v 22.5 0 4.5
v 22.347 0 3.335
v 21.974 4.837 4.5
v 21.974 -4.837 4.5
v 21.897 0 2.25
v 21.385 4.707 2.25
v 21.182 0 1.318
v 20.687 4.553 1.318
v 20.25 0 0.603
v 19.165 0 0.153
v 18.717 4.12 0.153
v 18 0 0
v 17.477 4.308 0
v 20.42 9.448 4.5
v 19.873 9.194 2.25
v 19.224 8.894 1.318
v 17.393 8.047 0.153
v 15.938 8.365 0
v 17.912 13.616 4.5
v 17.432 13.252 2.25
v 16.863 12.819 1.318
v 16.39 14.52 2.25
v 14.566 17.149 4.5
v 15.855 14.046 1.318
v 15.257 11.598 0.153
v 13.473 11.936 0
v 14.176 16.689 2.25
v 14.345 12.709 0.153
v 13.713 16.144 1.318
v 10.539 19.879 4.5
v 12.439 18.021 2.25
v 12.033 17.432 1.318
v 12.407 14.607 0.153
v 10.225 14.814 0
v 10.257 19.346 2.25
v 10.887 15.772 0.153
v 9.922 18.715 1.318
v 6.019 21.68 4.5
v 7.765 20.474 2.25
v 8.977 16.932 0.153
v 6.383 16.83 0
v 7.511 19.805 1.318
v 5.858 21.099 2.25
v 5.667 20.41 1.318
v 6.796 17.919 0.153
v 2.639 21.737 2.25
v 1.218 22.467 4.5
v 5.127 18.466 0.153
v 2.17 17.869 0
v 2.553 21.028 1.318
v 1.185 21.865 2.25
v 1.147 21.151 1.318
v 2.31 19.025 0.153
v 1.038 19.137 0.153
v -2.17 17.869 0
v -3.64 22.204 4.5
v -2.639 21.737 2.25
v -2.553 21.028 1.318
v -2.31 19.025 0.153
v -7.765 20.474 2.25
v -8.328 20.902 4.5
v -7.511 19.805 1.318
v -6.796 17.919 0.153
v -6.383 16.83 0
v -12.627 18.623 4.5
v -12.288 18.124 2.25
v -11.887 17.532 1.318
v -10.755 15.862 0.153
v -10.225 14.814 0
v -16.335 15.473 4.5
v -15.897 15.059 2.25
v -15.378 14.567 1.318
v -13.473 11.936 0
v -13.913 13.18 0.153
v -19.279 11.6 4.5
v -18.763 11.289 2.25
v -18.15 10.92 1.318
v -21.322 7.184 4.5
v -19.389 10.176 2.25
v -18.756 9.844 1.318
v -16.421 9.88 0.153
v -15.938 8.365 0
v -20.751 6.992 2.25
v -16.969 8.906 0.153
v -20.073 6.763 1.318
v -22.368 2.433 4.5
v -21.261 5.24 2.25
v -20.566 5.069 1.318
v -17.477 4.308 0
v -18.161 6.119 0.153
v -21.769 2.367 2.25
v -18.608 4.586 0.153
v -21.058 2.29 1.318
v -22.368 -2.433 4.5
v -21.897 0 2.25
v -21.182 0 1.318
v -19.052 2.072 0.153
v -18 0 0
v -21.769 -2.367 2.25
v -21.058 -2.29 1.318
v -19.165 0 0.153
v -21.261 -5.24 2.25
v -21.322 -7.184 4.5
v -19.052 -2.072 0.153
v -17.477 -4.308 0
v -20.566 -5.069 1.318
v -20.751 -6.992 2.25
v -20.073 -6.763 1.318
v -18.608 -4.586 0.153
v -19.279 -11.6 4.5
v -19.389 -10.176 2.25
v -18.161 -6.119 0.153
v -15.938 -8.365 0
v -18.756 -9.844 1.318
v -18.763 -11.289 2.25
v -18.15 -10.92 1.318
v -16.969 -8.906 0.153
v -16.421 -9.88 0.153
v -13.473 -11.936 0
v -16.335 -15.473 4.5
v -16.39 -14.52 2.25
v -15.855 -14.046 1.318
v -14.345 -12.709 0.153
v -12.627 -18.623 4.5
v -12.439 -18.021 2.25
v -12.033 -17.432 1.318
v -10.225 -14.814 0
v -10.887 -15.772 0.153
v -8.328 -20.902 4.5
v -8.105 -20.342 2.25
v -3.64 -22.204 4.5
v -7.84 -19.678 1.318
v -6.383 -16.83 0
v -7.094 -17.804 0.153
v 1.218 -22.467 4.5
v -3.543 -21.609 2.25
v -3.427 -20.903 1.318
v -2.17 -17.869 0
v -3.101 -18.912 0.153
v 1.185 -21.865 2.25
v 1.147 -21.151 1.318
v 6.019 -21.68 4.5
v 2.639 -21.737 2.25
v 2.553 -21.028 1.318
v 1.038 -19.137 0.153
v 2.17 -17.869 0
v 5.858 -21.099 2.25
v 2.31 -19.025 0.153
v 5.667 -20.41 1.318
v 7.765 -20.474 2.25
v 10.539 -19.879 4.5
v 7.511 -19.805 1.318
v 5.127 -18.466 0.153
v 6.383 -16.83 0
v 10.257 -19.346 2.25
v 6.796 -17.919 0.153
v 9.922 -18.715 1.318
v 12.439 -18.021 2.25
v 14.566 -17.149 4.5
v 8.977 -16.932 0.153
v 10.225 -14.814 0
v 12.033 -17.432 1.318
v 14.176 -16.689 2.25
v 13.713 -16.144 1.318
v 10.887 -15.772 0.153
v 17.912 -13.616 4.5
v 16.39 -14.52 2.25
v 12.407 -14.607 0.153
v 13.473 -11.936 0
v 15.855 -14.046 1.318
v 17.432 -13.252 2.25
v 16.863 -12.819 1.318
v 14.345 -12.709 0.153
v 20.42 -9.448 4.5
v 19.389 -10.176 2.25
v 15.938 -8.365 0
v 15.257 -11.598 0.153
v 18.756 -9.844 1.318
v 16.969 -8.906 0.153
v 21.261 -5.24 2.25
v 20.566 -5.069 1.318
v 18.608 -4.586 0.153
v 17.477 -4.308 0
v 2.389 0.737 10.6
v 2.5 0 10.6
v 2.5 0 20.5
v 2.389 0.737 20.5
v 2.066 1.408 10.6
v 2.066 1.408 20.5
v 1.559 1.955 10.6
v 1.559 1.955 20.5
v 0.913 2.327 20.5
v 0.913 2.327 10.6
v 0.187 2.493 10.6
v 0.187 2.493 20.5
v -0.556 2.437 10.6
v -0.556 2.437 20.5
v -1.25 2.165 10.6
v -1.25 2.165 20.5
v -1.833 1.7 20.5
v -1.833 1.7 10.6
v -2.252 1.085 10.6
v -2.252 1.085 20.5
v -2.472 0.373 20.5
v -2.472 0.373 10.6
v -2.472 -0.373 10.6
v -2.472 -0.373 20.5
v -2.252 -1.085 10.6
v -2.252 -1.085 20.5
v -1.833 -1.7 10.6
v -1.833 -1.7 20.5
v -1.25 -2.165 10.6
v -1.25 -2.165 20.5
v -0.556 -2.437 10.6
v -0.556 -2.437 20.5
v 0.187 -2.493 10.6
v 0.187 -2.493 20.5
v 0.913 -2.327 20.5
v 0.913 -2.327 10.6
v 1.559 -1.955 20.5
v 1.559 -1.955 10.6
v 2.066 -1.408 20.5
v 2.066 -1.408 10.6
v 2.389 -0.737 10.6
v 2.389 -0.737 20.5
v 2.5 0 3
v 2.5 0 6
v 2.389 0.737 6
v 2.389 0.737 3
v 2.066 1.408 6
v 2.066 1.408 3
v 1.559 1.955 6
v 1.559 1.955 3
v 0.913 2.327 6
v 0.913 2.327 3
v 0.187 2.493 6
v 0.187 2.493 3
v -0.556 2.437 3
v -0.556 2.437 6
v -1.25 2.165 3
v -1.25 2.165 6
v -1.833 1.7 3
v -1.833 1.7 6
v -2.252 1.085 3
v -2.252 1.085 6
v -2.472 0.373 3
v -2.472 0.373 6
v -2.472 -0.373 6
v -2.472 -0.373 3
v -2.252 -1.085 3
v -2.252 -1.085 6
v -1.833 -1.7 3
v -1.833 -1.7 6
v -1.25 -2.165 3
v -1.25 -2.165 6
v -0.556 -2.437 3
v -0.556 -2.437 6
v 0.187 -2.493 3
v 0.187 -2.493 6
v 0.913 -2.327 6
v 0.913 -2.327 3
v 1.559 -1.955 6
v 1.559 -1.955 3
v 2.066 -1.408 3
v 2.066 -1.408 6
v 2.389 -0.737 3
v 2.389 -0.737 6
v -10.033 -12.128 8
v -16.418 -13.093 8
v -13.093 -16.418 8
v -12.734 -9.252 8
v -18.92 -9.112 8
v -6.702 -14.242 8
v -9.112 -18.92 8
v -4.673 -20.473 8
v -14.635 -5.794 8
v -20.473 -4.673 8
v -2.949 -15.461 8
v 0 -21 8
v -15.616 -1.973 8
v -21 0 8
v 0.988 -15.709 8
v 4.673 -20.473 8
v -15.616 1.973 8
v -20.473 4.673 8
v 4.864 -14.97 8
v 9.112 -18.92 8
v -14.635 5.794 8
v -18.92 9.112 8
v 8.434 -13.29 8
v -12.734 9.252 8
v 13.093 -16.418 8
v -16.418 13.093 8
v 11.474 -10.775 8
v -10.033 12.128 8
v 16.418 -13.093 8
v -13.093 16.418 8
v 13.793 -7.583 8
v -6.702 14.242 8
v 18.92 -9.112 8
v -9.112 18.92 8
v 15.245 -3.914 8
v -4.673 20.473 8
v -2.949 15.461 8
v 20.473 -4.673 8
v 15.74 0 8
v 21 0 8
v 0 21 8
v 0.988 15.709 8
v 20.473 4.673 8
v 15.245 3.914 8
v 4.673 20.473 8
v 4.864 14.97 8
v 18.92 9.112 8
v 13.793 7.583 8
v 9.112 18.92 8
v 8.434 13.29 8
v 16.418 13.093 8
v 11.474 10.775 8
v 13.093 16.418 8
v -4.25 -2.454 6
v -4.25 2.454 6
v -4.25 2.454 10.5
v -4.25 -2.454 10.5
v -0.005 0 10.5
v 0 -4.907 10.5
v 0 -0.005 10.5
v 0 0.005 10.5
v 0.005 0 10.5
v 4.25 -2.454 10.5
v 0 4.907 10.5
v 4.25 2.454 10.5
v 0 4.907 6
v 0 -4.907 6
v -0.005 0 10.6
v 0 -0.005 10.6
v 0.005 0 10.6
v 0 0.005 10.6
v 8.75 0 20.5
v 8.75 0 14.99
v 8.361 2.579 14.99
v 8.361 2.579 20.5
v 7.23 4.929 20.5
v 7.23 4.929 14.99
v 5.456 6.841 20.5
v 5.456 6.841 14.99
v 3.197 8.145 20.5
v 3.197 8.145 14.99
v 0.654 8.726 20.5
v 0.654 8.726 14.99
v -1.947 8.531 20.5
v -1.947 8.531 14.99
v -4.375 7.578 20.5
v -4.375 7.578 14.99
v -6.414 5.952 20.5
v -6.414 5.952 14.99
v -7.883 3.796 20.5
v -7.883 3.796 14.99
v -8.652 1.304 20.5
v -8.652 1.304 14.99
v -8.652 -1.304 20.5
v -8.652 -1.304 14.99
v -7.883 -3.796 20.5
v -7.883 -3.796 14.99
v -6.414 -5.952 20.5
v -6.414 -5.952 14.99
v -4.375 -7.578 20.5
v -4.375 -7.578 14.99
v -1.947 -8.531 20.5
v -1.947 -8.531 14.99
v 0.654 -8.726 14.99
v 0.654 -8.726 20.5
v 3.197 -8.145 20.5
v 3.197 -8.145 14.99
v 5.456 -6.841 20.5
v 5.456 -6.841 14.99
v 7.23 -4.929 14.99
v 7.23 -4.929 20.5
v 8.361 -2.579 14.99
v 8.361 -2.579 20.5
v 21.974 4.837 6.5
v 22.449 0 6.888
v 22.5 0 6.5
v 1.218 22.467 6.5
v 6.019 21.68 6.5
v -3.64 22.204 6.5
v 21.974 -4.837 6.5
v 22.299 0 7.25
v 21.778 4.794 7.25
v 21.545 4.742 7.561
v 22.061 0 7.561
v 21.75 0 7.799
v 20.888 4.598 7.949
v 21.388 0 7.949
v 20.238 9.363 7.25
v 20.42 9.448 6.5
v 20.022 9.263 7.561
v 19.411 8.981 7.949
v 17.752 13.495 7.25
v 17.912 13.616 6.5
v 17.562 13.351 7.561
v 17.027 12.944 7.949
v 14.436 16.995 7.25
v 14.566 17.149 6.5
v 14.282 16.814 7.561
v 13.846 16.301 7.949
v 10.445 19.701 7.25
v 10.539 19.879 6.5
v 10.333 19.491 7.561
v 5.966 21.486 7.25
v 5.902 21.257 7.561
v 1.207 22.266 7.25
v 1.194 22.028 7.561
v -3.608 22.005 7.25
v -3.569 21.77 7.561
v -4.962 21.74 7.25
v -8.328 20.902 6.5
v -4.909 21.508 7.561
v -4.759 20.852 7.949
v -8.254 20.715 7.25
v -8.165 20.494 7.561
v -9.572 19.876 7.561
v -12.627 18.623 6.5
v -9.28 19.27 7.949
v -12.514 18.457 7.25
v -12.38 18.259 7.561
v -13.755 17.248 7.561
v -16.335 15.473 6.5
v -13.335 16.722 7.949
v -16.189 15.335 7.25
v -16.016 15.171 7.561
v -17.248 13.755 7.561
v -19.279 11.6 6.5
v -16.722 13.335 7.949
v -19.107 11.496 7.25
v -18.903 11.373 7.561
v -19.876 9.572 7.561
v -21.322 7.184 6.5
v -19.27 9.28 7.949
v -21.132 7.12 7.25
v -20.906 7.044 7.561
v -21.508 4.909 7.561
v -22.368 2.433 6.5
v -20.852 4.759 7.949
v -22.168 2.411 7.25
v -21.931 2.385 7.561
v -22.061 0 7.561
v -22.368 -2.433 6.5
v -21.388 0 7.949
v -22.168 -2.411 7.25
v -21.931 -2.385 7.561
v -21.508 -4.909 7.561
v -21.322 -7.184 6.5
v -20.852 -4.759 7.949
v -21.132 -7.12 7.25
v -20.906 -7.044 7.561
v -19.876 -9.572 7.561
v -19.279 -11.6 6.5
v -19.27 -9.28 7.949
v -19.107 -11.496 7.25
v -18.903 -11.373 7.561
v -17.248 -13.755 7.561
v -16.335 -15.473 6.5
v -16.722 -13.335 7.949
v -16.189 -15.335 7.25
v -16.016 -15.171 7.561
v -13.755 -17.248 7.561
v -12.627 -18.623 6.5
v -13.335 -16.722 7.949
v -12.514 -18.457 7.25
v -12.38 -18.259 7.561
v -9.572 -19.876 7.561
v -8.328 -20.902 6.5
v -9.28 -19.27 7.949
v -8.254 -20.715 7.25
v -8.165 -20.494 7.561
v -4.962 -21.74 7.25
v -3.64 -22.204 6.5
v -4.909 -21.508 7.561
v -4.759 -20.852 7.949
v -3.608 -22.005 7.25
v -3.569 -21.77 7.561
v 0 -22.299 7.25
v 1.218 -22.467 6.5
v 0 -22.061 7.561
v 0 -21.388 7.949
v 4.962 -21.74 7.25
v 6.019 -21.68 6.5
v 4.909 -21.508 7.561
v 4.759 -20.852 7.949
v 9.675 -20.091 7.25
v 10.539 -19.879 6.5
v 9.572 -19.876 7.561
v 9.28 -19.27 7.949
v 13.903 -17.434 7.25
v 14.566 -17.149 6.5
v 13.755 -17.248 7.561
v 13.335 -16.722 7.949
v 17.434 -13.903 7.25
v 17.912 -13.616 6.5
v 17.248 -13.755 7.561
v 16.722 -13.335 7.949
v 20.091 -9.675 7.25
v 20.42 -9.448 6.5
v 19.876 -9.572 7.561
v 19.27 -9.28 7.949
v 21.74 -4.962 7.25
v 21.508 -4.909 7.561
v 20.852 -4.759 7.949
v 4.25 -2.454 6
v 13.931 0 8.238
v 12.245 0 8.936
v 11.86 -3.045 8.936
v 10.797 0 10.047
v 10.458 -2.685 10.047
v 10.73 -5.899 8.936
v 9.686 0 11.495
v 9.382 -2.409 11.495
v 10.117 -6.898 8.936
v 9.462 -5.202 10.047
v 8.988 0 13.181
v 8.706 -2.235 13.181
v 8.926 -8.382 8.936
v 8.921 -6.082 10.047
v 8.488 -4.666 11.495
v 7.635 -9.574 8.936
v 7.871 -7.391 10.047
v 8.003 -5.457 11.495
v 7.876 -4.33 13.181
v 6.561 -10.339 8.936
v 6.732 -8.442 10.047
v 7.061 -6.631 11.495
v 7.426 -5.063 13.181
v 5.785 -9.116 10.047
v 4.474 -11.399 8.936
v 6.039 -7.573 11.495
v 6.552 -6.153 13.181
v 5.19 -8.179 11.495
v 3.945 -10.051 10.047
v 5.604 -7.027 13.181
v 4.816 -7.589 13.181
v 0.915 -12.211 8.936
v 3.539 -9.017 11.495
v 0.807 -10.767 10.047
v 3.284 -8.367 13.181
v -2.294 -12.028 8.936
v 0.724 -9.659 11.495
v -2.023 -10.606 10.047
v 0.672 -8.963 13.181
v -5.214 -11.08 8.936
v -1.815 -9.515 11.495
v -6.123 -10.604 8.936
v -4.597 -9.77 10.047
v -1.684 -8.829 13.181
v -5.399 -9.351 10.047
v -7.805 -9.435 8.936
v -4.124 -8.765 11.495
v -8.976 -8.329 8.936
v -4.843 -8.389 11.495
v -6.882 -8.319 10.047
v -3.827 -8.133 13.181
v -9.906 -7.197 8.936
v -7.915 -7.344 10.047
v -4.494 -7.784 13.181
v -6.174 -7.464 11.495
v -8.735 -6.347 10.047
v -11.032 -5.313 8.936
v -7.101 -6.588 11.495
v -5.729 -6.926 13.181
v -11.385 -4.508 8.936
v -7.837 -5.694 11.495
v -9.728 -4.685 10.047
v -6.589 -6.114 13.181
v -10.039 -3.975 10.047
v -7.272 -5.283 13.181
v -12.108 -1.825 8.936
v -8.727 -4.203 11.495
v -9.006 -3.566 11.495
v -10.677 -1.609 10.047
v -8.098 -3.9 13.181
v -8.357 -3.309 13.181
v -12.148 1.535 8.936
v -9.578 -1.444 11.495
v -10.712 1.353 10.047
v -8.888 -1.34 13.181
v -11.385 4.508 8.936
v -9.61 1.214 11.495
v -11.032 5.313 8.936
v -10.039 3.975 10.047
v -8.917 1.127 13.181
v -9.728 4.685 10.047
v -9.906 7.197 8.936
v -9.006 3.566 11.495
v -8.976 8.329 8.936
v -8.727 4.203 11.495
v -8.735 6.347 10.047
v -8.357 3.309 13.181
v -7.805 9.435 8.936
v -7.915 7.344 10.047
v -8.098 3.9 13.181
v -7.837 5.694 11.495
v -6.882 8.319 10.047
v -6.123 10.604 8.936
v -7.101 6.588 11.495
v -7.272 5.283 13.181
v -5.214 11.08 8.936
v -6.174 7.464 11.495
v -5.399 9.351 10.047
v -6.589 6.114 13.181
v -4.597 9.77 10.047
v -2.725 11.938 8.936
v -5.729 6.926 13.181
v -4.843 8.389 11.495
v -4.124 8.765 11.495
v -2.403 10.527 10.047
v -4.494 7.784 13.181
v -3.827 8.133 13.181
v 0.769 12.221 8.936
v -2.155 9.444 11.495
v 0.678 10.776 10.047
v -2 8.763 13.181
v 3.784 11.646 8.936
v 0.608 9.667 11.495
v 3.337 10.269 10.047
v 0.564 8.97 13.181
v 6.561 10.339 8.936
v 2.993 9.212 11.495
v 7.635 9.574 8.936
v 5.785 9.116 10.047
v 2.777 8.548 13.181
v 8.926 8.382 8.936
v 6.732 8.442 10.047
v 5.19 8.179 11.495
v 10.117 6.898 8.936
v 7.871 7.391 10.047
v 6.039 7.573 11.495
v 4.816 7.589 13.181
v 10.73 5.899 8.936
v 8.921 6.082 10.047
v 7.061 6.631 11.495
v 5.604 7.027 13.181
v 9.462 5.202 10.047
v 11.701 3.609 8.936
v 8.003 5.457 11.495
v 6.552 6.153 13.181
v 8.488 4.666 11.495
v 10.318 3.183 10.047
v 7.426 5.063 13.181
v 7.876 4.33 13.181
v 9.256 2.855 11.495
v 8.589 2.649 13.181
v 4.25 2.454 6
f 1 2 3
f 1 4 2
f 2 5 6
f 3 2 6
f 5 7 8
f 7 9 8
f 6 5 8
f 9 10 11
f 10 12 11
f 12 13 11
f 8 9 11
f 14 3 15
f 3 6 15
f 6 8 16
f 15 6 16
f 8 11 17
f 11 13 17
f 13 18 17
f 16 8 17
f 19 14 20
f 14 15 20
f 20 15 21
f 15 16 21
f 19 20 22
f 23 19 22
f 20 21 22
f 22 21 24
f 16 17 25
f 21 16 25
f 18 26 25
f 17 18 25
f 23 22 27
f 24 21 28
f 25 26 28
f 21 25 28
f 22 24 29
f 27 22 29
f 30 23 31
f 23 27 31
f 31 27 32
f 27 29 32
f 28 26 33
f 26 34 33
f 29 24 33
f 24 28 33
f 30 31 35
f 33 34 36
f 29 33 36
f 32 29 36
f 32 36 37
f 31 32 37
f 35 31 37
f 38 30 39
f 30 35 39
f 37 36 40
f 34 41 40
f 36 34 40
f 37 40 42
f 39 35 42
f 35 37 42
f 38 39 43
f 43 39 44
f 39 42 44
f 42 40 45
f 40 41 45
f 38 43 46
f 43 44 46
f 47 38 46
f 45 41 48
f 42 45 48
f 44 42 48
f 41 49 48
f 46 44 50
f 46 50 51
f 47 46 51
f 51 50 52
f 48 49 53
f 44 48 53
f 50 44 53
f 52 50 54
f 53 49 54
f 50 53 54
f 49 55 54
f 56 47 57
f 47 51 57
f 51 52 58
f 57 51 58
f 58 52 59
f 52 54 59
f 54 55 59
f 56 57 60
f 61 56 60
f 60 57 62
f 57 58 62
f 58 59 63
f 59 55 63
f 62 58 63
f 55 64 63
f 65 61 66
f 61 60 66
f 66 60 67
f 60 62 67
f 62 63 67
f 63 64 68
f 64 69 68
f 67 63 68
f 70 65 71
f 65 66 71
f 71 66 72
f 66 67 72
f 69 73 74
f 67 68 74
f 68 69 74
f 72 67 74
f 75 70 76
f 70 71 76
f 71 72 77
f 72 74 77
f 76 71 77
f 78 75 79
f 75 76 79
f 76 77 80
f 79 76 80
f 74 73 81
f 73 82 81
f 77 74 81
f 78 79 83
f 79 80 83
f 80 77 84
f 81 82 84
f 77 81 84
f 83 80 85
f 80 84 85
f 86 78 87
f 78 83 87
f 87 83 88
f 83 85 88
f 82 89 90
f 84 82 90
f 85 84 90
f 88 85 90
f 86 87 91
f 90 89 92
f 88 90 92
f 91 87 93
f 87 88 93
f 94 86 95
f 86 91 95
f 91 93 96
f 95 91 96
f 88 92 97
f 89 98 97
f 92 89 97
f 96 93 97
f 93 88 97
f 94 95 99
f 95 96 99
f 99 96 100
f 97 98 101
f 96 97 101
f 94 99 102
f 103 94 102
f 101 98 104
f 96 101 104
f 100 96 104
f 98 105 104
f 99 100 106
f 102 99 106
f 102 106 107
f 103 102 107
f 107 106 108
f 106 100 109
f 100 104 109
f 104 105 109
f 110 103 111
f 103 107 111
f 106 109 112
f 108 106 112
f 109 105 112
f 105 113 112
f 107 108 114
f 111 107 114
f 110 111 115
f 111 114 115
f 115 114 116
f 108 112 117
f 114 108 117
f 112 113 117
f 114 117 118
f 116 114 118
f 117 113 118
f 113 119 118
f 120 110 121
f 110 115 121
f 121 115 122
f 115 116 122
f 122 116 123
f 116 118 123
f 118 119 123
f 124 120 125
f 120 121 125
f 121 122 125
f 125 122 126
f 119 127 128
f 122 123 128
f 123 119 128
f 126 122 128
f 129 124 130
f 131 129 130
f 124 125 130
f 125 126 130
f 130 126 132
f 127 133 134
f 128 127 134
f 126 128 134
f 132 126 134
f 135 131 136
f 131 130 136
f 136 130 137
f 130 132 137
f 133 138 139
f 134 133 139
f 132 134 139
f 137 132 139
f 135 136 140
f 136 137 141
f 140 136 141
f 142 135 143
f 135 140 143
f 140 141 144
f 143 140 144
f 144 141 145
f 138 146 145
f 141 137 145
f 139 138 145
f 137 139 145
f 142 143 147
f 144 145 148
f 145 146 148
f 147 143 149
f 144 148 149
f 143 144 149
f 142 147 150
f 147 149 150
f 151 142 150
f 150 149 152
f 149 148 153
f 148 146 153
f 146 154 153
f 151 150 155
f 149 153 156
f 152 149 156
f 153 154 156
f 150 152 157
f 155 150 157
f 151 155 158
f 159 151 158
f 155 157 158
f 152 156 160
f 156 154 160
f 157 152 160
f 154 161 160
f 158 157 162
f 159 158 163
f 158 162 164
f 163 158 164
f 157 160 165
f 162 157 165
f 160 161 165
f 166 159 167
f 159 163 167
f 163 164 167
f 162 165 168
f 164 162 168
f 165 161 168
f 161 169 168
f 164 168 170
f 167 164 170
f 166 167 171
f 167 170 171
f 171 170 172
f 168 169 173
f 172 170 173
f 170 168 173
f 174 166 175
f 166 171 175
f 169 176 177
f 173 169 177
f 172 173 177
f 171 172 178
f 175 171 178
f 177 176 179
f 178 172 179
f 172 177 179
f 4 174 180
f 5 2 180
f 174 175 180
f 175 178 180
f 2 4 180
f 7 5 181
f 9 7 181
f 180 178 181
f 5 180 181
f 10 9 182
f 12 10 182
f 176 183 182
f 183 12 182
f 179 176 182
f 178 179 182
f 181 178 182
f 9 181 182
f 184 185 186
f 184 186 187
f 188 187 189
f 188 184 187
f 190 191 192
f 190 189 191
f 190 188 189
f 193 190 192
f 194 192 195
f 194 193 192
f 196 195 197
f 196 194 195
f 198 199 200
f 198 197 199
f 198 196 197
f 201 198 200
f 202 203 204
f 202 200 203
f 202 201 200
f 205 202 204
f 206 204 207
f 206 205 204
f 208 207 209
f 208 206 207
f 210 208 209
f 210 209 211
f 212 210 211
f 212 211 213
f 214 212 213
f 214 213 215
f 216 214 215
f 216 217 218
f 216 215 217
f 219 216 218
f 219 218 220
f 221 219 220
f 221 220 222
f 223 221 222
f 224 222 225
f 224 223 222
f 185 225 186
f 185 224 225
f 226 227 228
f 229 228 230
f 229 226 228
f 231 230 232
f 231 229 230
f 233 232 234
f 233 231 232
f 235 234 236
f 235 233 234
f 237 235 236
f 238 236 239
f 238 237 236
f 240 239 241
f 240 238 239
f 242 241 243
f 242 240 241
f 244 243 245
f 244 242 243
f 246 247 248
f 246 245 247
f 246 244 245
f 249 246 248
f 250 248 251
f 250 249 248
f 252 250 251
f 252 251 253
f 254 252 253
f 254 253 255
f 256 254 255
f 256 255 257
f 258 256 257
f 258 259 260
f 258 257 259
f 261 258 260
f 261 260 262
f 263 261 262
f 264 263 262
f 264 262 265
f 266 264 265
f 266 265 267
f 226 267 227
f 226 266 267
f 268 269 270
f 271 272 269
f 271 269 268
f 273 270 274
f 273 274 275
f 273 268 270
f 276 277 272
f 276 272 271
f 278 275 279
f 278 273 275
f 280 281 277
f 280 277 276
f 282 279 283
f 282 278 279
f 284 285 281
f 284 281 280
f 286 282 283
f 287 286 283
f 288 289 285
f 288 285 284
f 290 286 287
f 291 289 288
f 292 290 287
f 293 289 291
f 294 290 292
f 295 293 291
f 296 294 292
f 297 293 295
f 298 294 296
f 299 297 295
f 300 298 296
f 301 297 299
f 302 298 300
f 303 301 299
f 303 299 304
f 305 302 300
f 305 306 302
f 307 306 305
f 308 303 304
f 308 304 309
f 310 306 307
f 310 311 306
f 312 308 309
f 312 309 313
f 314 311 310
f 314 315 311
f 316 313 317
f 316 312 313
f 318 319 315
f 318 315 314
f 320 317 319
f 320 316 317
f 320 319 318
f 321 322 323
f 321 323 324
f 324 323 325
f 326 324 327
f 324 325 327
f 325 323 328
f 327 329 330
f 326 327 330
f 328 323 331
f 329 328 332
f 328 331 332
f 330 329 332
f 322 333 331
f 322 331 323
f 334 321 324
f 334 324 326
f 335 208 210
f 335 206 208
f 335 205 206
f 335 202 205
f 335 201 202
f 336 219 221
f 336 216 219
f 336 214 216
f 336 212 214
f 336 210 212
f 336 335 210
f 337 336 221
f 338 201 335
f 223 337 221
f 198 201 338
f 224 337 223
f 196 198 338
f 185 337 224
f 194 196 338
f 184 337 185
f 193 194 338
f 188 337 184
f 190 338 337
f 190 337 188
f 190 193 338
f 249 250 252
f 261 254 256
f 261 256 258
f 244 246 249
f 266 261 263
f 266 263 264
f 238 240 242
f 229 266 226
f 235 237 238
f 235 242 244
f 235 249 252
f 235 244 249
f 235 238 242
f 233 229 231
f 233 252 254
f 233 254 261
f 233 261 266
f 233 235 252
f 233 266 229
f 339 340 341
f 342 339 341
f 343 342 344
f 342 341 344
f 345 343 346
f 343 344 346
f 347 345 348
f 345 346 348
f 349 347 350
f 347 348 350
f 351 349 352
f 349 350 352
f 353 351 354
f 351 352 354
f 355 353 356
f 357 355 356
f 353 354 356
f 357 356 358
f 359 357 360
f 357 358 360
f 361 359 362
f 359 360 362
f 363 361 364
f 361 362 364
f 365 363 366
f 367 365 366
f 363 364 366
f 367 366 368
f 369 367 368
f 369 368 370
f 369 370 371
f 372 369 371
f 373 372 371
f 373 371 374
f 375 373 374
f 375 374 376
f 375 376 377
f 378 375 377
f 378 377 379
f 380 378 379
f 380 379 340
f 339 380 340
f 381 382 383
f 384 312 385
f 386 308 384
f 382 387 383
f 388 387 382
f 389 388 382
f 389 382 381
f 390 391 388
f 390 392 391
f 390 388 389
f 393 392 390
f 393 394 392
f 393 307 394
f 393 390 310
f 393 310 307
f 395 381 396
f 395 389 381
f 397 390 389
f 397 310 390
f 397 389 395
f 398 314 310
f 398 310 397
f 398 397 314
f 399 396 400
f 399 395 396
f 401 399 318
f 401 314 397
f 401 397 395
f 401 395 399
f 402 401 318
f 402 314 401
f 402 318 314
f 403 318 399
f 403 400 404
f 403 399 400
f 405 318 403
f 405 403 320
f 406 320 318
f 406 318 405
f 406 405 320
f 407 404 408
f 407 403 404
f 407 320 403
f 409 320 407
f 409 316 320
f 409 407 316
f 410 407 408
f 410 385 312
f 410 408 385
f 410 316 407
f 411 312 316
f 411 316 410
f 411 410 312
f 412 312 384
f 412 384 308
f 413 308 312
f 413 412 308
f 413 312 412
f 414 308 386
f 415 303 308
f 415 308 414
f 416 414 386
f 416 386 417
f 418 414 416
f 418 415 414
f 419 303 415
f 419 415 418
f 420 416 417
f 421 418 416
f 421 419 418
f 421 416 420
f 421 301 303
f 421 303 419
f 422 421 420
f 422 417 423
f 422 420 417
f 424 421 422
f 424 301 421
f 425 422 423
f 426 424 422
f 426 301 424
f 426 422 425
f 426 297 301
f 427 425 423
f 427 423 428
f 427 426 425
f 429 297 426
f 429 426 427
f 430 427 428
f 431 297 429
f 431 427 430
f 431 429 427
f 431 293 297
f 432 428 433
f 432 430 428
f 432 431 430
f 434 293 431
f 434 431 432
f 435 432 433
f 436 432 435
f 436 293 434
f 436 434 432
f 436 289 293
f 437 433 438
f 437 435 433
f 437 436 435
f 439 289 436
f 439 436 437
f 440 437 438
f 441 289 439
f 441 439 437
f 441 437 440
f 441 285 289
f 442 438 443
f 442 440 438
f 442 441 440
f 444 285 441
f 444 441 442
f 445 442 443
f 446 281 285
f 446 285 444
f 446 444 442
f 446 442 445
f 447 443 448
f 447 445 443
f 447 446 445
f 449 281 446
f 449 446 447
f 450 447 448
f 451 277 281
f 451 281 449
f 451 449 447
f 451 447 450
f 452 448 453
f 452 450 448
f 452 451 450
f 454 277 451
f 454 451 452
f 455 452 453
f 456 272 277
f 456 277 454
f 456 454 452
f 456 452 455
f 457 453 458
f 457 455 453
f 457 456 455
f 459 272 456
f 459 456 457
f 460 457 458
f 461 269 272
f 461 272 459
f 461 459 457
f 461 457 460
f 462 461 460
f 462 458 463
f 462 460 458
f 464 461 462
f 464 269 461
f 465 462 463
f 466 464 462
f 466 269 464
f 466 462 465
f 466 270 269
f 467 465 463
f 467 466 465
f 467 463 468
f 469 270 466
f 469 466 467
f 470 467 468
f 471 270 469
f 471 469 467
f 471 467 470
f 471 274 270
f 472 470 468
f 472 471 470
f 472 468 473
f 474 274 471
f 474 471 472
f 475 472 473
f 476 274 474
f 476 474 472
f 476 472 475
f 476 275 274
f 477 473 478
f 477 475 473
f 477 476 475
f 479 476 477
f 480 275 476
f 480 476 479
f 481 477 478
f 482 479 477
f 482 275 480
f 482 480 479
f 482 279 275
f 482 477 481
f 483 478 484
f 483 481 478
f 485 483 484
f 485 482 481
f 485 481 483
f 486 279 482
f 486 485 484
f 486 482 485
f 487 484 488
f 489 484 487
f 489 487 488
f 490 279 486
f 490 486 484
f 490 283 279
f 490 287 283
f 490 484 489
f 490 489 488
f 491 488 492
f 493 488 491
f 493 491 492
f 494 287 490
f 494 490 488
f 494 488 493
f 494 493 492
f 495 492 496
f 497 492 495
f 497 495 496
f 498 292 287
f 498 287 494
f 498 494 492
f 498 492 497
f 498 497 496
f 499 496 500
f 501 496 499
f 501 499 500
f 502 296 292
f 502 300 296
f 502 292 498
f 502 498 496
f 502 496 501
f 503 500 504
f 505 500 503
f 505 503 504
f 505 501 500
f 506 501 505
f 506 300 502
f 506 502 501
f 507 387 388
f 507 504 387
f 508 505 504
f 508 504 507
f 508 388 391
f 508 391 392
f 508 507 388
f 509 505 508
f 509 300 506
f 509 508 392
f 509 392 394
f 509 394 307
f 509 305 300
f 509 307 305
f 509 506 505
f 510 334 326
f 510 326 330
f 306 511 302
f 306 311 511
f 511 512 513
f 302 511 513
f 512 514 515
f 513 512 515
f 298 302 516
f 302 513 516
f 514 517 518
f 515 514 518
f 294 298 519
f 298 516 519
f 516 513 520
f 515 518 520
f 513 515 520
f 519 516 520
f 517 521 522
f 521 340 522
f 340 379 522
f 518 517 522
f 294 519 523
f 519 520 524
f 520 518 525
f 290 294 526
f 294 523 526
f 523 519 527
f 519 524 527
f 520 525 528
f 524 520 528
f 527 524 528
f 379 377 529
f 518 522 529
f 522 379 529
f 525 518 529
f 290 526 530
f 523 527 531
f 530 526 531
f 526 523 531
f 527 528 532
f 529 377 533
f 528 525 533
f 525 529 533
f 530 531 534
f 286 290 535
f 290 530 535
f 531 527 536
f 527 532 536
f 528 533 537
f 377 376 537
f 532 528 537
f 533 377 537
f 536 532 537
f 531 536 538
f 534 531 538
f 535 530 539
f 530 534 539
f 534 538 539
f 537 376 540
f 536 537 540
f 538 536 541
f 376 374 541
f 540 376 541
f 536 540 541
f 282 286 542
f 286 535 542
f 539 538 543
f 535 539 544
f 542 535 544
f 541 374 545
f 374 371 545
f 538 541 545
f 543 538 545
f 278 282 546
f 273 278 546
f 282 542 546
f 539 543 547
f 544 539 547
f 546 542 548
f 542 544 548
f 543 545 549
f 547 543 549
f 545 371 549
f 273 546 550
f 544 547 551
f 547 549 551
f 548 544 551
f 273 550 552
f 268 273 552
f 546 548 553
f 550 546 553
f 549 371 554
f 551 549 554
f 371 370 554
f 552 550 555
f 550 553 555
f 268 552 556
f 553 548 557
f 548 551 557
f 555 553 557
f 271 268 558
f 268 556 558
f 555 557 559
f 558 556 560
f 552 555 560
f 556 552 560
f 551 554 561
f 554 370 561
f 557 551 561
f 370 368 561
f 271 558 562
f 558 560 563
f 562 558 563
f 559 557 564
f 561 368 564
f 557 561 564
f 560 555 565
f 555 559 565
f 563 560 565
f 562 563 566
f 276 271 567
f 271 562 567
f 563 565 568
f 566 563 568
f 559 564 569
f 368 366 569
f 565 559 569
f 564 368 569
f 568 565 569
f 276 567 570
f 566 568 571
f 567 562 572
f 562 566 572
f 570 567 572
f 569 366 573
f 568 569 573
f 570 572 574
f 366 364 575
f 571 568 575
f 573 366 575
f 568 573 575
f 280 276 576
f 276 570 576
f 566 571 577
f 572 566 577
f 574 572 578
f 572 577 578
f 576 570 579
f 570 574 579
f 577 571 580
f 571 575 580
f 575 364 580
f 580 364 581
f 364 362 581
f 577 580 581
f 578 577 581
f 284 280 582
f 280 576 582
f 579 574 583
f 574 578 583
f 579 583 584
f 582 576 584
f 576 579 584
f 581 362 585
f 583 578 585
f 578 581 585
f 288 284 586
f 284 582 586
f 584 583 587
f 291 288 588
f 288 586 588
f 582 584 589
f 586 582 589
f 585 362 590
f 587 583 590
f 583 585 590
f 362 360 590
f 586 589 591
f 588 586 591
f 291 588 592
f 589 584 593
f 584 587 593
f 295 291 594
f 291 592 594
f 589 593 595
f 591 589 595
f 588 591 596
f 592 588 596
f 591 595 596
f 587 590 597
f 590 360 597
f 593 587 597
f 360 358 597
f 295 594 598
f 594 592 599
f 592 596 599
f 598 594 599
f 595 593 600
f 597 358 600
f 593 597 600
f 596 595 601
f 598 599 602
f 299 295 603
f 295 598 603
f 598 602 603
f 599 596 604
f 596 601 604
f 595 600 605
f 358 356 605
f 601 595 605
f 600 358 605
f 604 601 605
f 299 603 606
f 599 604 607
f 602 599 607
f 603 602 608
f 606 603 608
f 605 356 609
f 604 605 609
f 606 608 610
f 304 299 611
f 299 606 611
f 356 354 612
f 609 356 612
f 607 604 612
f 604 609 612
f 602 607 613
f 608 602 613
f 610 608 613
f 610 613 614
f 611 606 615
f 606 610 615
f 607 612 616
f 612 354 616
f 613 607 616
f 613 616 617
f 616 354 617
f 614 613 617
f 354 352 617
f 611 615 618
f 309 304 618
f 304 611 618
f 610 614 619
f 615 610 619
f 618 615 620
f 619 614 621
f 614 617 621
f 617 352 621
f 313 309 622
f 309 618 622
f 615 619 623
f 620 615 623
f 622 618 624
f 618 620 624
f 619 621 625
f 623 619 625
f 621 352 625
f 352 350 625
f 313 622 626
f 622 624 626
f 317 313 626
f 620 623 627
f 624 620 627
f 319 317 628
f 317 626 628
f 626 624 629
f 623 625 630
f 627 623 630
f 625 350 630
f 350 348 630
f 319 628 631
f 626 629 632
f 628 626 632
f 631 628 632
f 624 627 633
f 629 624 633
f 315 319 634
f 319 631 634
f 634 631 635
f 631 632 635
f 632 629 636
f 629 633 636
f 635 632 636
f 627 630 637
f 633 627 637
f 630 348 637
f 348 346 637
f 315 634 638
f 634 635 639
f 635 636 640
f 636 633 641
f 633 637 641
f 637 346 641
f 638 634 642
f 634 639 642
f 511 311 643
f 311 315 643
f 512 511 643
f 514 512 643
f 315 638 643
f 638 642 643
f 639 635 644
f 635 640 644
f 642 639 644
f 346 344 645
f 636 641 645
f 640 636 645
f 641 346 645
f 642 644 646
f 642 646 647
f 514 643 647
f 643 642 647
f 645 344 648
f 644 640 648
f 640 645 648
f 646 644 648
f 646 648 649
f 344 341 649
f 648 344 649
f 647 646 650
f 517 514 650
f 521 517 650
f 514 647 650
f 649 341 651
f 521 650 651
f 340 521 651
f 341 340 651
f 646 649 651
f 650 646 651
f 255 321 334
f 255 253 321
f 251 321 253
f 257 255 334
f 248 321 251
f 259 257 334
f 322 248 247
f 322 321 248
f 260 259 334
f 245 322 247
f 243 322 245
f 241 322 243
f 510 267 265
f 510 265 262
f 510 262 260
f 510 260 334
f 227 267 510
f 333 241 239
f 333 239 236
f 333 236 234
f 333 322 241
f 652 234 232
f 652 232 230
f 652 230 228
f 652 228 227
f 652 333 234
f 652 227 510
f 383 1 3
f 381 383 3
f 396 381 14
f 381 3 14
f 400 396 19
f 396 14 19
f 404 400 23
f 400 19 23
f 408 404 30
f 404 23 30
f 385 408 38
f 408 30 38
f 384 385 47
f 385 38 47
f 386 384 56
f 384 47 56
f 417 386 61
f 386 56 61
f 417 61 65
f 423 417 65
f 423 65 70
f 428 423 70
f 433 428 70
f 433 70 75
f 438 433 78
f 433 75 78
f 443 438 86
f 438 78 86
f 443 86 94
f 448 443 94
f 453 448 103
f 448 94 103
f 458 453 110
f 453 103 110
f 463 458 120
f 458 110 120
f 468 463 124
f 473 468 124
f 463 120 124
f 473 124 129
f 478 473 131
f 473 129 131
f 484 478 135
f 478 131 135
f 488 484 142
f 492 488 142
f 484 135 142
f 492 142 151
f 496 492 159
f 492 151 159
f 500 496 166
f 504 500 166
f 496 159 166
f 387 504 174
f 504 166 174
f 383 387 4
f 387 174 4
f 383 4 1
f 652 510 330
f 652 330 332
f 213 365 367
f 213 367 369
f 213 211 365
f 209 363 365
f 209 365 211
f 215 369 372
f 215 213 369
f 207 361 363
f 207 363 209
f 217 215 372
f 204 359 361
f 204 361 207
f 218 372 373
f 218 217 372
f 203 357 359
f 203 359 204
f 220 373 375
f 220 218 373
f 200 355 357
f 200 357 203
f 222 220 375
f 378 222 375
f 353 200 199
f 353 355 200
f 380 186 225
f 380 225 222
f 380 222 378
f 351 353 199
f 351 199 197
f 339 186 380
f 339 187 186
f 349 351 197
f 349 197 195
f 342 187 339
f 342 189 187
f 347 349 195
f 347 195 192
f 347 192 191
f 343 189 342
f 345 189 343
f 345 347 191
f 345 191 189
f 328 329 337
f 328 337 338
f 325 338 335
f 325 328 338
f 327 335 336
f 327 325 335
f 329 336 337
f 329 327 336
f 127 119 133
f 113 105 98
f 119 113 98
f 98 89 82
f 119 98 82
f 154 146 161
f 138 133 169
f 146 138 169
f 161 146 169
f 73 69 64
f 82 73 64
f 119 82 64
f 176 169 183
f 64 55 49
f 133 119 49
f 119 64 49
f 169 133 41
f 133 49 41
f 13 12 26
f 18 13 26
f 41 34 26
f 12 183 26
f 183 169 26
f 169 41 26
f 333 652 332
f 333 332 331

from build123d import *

# Parameters (mm, degrees)
SKETCH_R        = 22.5
PAD_DEPTH       = 8
SKETCH001_R     = 8.75
PAD001_DEPTH    = 20.5
SKETCH002_R     = 6
SKETCH002_R_2   = 5
PAD002_DEPTH    = 13
FILLET_R        = 6.99
FILLET001_R     = 4.5
POCKET_DEPTH    = 4.5
FILLET002_R     = 1.5
SKETCH008_R     = 2.5
POCKET001_DEPTH = 18
SKETCH009_W     = 10
SKETCH009_H     = 10
SKETCH009_R     = 0.005
PAD007_DEPTH    = 0.1


with BuildPart() as part:
    # Sketch (on XY_Plane of Origin) → Pad (new body)
    with BuildSketch(Plane.XY):
        Circle(SKETCH_R)
    extrude(amount=PAD_DEPTH)

    # Sketch001 (on XY_Plane of Origin) → Pad001 (join)
    with BuildSketch(Plane.XY):
        Circle(SKETCH001_R)
    extrude(amount=PAD001_DEPTH)

    # Sketch002 (on XY_Plane of Origin) → Pad002 (join)
    with BuildSketch(Plane.XY):
        Circle(SKETCH002_R)
        Circle(SKETCH002_R_2, mode=Mode.SUBTRACT)
    extrude(amount=PAD002_DEPTH)

    # Fillet
    fillet_edges = [part.edges().sort_by_distance(p)[0] for p in [
        (-8.75, 0, 8),
    ]]
    fillet(fillet_edges, radius=FILLET_R)

    # Fillet001
    fillet001_edges = [part.edges().sort_by_distance(p)[0] for p in [
        (-22.5, 0, 0),
    ]]
    fillet(fillet001_edges, radius=FILLET001_R)

    # Sketch003 (on XY_Plane of Origin) → Pocket (cut)
    with BuildSketch(Plane.XY.offset(6)):
        Polygon((4.25, 2.453739), (0, 4.907477), (-4.25, 2.453739), (-4.25, -2.453739), (0, -4.907477), (4.25, -2.453739), align=None)
    extrude(amount=POCKET_DEPTH, mode=Mode.SUBTRACT)

    # Fillet002
    fillet002_edges = [part.edges().sort_by_distance(p)[0] for p in [
        (-22.5, 0, 8),
    ]]
    fillet(fillet002_edges, radius=FILLET002_R)

    # Sketch008 (on XY_Plane of Origin) → Pocket001 (cut)
    with BuildSketch(Plane.XY.offset(3)):
        Circle(SKETCH008_R)
    extrude(amount=POCKET001_DEPTH, mode=Mode.SUBTRACT)

    # Sketch009 (on XY_Plane of Origin) → Pad007 (join)
    with BuildSketch(Plane.XY.offset(10.5)):
        Rectangle(SKETCH009_W, SKETCH009_H)
        Circle(SKETCH009_R, mode=Mode.SUBTRACT)
    extrude(amount=PAD007_DEPTH)


solid = part.part
